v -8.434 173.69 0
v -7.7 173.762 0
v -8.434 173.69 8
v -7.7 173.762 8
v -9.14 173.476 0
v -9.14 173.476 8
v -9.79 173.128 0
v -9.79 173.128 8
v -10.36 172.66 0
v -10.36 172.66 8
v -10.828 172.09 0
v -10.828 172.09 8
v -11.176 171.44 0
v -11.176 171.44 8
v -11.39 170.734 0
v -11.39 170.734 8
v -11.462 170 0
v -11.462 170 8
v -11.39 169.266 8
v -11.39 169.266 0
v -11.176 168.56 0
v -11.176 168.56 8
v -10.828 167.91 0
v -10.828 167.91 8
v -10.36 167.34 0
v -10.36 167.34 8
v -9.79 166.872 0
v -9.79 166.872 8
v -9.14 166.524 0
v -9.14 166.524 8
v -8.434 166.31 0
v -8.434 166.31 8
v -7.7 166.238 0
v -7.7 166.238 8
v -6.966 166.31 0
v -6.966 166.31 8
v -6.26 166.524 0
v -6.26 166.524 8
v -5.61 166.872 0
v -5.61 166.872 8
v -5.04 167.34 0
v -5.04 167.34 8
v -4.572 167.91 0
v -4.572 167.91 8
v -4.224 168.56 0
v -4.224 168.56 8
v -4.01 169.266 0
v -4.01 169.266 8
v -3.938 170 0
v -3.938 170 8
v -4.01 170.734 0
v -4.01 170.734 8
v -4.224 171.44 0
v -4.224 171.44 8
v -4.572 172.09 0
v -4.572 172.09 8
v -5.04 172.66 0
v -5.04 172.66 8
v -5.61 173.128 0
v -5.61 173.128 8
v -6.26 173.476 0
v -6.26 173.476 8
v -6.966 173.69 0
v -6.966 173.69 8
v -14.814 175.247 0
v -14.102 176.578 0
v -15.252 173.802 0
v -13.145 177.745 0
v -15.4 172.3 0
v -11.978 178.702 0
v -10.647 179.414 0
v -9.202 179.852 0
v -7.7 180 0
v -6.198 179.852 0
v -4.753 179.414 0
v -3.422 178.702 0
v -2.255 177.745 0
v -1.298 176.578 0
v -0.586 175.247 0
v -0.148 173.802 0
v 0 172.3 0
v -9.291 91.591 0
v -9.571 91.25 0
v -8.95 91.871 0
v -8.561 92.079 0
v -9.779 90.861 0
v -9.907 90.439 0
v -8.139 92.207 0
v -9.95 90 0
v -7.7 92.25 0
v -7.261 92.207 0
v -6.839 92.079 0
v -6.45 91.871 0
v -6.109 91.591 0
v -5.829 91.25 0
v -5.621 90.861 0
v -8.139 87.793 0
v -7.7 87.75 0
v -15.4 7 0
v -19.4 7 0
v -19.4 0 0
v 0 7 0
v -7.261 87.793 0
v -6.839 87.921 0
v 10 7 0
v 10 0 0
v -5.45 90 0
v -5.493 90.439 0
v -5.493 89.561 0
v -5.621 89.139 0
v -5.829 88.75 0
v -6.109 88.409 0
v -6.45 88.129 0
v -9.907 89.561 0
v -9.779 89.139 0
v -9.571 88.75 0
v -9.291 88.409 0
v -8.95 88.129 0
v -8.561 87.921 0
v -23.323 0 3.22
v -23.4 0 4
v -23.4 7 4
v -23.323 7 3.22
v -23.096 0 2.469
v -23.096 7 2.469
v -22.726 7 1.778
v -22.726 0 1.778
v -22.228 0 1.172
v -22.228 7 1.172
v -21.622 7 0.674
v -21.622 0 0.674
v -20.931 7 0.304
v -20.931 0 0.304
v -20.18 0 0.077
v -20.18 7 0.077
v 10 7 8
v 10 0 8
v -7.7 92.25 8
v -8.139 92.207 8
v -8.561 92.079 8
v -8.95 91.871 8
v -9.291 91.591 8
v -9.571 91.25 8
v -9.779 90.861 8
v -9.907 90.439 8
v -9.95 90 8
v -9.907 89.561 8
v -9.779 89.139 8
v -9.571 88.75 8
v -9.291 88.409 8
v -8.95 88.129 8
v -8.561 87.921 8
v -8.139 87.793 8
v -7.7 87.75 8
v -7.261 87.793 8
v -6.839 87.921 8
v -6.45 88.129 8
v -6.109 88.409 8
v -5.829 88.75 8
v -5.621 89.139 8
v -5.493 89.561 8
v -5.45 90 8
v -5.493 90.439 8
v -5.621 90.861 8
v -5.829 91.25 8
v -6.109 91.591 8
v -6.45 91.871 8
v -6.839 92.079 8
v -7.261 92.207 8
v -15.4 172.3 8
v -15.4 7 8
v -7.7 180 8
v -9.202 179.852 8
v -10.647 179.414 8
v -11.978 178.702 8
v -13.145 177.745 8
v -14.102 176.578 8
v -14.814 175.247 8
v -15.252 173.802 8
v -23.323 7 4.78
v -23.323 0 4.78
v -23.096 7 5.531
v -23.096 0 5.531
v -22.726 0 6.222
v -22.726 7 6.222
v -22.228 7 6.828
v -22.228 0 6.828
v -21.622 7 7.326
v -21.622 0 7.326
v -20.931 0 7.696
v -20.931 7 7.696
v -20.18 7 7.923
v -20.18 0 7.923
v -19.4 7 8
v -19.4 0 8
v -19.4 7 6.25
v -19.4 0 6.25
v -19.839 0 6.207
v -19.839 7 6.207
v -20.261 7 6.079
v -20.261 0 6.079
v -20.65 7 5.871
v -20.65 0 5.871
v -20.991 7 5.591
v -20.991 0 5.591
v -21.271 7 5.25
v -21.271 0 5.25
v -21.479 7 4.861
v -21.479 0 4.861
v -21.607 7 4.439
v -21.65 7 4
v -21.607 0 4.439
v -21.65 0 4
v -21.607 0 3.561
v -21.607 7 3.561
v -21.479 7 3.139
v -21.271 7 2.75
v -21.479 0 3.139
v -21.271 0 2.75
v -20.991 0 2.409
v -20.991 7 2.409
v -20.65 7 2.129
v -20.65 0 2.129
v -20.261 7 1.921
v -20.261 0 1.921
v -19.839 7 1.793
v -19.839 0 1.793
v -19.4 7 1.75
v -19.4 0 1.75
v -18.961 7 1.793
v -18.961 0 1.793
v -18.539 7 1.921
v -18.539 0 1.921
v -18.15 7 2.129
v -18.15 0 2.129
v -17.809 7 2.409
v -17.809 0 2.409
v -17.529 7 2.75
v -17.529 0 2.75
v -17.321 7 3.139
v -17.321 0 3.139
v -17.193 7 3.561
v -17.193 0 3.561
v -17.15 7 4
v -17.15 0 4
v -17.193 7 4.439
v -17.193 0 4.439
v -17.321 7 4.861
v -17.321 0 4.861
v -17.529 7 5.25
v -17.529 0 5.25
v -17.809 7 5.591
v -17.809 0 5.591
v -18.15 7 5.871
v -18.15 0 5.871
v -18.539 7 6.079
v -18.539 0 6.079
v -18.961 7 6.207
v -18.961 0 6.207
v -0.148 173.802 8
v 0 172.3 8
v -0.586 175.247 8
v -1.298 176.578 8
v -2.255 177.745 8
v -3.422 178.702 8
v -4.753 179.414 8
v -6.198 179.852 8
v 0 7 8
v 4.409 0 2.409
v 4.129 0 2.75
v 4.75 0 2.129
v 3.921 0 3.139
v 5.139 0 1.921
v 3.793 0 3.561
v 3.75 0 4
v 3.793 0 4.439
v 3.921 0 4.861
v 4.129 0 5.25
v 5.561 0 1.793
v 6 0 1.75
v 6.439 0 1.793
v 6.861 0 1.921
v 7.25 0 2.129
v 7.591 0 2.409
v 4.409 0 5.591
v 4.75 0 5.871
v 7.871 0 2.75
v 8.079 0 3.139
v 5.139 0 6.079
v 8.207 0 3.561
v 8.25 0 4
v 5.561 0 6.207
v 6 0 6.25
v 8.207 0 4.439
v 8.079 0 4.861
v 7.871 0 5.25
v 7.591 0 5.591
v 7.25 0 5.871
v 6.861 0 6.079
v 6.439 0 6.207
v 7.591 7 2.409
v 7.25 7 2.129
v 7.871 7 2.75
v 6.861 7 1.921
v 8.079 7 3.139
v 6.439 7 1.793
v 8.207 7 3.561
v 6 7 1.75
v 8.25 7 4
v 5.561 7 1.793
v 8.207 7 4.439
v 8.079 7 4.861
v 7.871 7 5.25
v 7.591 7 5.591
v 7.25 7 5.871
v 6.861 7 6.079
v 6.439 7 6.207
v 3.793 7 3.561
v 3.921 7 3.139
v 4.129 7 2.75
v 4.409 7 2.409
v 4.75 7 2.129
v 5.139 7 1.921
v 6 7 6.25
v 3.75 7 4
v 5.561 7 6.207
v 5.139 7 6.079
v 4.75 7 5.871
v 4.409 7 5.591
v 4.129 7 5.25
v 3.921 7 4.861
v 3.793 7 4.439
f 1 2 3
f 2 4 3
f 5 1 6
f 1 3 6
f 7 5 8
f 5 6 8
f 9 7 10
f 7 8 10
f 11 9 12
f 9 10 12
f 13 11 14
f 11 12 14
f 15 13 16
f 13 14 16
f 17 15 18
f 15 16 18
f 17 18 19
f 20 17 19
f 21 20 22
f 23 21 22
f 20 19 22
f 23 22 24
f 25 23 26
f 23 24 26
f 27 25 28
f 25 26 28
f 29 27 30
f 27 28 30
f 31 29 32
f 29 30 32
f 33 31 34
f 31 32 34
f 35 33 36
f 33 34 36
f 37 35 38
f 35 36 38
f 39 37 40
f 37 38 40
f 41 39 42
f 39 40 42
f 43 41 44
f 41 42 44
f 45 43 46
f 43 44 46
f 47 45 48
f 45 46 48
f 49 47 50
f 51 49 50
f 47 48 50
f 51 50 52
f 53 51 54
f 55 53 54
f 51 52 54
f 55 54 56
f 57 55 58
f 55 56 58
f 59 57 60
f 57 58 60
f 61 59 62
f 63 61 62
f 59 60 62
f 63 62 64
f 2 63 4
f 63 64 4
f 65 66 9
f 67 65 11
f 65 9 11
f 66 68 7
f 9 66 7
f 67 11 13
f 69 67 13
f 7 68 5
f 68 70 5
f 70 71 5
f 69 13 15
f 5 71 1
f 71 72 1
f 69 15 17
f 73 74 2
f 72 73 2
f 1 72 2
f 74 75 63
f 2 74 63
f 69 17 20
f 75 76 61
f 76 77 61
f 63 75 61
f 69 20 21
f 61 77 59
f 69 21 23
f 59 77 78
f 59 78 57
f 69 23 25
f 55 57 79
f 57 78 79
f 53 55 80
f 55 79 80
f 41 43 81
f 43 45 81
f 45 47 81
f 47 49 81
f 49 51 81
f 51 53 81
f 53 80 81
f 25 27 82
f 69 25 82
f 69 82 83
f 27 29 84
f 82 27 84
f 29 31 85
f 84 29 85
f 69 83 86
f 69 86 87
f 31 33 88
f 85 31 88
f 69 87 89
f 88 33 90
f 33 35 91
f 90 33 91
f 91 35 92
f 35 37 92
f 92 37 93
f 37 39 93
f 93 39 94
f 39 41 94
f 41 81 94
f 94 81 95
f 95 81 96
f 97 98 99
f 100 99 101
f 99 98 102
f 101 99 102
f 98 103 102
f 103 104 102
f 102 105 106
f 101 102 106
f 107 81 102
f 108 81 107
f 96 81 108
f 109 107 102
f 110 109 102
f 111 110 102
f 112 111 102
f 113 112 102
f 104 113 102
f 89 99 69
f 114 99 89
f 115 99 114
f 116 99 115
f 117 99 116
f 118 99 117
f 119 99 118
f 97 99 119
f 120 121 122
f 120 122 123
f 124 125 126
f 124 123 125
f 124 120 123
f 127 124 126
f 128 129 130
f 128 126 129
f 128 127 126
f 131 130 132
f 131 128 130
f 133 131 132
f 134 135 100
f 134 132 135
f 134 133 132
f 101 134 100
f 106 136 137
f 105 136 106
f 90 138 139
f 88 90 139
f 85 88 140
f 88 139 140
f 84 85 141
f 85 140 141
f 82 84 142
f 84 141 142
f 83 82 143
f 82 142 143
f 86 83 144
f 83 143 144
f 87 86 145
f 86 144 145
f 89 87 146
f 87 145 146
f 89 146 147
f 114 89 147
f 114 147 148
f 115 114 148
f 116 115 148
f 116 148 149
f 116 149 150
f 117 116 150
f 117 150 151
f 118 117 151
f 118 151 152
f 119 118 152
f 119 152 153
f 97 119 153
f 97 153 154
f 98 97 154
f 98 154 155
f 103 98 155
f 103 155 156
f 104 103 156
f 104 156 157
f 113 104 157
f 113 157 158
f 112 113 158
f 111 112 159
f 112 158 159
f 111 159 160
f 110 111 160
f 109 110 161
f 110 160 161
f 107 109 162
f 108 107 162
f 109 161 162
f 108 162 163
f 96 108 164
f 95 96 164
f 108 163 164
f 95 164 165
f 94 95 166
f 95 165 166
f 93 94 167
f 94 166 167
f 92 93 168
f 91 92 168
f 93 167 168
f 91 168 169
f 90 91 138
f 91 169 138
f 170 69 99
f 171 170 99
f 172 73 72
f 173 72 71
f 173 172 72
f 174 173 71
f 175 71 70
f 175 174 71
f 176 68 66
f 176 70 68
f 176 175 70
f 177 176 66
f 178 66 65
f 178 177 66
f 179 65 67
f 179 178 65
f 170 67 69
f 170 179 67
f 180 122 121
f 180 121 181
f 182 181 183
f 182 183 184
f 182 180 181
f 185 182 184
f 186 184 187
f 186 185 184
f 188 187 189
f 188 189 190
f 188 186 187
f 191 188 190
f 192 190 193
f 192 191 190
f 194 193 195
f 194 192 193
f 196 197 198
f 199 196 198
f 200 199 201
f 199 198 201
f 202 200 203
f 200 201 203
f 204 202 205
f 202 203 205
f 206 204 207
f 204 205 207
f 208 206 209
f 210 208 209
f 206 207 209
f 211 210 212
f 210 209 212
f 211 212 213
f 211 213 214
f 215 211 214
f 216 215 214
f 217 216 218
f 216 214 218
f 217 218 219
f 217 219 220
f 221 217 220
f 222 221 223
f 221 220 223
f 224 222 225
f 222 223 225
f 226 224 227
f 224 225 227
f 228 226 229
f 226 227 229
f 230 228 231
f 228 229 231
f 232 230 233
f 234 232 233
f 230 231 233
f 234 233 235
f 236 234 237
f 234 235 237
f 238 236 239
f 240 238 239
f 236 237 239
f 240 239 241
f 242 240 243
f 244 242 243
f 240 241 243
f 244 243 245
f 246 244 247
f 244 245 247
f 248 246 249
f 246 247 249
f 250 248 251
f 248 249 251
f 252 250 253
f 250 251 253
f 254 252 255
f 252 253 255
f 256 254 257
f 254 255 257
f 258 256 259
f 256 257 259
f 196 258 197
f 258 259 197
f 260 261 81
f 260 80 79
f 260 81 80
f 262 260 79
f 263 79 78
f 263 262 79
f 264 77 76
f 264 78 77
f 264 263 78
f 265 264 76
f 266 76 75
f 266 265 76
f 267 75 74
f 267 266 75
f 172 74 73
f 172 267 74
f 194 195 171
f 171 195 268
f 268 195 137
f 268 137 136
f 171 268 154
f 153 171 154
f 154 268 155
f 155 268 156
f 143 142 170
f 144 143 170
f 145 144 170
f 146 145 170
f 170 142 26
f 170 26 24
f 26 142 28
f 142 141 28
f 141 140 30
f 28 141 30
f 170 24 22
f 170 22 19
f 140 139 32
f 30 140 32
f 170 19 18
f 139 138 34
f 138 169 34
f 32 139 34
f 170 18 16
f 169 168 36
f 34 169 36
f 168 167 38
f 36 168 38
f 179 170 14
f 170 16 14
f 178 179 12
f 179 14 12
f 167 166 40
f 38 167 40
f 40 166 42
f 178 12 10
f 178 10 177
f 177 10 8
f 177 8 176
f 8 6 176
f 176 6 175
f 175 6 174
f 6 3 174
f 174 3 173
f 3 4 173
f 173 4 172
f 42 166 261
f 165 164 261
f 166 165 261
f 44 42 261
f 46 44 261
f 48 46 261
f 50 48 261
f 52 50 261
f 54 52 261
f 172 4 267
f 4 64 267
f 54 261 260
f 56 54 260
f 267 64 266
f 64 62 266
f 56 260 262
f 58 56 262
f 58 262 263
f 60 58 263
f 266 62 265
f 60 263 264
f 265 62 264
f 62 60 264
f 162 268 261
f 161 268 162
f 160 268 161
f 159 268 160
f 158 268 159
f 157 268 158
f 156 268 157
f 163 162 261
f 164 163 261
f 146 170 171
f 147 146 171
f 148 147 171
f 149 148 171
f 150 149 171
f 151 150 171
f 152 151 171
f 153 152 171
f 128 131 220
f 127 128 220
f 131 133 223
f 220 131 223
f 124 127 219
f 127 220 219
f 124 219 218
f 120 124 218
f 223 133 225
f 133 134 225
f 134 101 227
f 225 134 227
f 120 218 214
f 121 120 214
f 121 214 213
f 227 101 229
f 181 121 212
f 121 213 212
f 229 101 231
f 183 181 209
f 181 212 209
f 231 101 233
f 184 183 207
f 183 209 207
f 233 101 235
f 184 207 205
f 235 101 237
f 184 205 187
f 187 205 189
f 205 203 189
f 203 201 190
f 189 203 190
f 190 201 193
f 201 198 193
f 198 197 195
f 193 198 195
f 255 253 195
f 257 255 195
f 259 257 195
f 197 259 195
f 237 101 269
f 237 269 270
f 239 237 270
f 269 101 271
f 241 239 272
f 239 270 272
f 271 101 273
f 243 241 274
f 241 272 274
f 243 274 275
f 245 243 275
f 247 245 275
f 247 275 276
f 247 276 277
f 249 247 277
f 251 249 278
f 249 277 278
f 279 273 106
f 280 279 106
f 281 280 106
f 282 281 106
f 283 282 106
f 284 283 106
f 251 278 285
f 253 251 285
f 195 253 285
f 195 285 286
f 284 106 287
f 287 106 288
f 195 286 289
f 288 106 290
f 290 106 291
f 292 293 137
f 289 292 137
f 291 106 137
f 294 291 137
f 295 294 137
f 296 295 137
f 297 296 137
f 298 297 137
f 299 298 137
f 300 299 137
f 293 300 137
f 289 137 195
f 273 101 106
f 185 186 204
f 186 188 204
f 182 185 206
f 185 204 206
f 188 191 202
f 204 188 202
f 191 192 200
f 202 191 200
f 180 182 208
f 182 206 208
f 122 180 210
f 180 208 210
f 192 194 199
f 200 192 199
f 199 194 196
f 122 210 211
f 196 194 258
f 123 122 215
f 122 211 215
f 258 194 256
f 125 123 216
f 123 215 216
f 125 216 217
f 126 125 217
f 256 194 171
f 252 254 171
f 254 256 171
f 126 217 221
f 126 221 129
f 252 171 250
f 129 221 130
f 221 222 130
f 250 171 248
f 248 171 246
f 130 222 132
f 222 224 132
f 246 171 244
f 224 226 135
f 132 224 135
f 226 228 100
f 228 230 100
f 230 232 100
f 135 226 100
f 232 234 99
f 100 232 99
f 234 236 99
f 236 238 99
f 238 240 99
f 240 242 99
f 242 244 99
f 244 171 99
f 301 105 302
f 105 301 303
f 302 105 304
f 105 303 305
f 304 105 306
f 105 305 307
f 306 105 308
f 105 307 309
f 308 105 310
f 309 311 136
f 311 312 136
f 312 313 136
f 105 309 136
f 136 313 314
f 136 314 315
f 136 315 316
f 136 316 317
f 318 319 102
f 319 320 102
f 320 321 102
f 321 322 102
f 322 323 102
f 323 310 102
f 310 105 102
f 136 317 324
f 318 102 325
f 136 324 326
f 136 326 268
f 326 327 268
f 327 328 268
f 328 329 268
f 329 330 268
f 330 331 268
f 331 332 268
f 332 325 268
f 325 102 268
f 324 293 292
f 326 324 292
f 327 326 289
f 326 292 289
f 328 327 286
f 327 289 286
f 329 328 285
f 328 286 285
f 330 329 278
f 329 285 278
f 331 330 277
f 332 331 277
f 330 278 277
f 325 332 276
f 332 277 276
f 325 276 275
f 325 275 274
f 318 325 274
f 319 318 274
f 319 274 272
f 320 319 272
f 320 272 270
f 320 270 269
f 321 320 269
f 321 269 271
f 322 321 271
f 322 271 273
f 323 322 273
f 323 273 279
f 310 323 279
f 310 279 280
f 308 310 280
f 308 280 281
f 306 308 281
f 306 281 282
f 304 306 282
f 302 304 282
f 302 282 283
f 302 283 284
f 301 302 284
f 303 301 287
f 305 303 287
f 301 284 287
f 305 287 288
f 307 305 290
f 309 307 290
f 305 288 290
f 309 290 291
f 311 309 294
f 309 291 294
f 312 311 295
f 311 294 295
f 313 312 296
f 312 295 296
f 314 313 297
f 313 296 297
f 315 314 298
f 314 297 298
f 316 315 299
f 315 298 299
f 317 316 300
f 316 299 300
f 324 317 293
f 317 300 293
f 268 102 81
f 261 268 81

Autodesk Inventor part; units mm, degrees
ref_plane "YZ Plane" through (0, 0, 0) normal (1, 0, 0) x (0, 1, 0)
ref_plane "XZ Plane" through (0, 0, 0) normal (0, 1, 0) x (-1, 0, 0)
ref_plane "XY Plane" through (0, 0, 0) normal (0, 0, 1) x (1, 0, 0)
sketch "Sketch1" plane through (0, 0, 0) normal (0, 0, 1) x (1, 0, 0)
  line L0 (-15.4, 0) -> (0, 0)
  line L1 (0, 0) -> (0, 180)
  line L2 (0, 180) -> (-15.4, 180)
  line L3 (-15.4, 180) -> (-15.4, 0)
  point P0 (0, 0)
  point P1 (-7.7, 170)
  dimension "d0" = 15.4
  dimension "d1" = 180
  dimension "d2" = 0
  dimension "d3" = 0
  dimension "d4" = 7.7
  dimension "d5" = 170
extrude "Extrusion1" add sketch "Sketch1" along normal blind 8
hole "Hole1" at (-7.7, 170, 0) direction (0, 0, 1) diameter 7.525 end through all
sketch "Sketch2" plane through (0, 0, 0) normal (1, 0, 0) x (0, 0, -1)
  point P0 (0, 0)
sketch "Sketch5" plane through (0, 0, 0) normal (0, 0, -1) x (-1, 0, 0)
  line L0 (15.4, 180) -> (15.4, 0) projected
  line L1 (15.4, 0) -> (0, 0) projected
  point P0 (7.7, 90)
  dimension "d27" = 7.7
  dimension "d28" = 90
full round fillet "Full Round Fillet1" first side at (0, 60, 2.6667) centre faces at (-5.1333, 180, 2.6667) second side at (-15.4, 120, 2.6667)
hole "Hole3" at (-7.7, 90, 0) direction (0, 0, 1) diameter 4.5 end through all clearance for "Flat Head Machine Screw" size "M4" standard "Ansi Metric M Profile"
sketch "Sketch6" plane through (0, 0, 8) normal (1, 0, 0) x (0, 0, -1)
  line L0 (0, 172.3) -> (0, 0) projected
  line L1 (8, 172.3) -> (8, 0) projected
  line L2 (0, 0) -> (8, 0)
  line L3 (8, 0) -> (8, 7)
  line L4 (8, 7) -> (0, 7)
  line L5 (0, 7) -> (0, 0)
  point P0 (8, 0)
  point P1 (0, 7)
  dimension "d36" = 7
extrude "Extrusion3" add sketch "Sketch6" along normal blind 10
sketch "Sketch7" plane through (0, 7, 8) normal (0, 1, 0) x (1, 0, 0)
  line L0 (0, 8) -> (10, 8) projected
  line L1 (10, 8) -> (10, 0) projected
  point P0 (6, 4)
  dimension "d39" = 4
  dimension "d40" = 4
hole "Hole4" at (6, 7, 4) direction (0, -1, 0) diameter 4.5 end through all clearance for "Flat Head Machine Screw" size "M4" standard "Ansi Metric M Profile"
sketch "Sketch8" plane through (-15.4, 0, 0) normal (-1, 0, 0) x (0, 0, 1)
  point P0 (0, 0)
sketch "Sketch9" plane through (-15.4, 0, 0) normal (-1, 0, 0) x (0, 0, 1)
  line L0 (0, 0) -> (8, 0) projected
  line L1 (8, 7) -> (8, 172.3) projected
  line L2 (0, 0) -> (8, 0)
  line L3 (8, 0) -> (8, 7)
  line L4 (8, 7) -> (0, 7)
  line L5 (0, 7) -> (0, 0)
extrude "Extrusion4" add sketch "Sketch9" along normal blind 8
sketch "Sketch10" plane through (-15.4, 7, 8) normal (0, 1, 0) x (1, 0, 0)
  line L0 (-8, 0) -> (-8, 8) projected
  line L1 (0, 8) -> (-8, 8) projected
  line L2 (0, 8) -> (0, 0) projected
  point P0 (15.4, 8)
  point P1 (-4, 4)
  dimension "d51" = 4
  dimension "d59" = 4
hole "Hole5" at (-19.4, 7, 4) direction (0, -1, 0) diameter 4.5 end through all clearance for "Flat Head Machine Screw" size "M4" standard "Ansi Metric M Profile"
full round fillet "Full Round Fillet2" first side at (-7.7, 33.9167, 8) centre faces at (-23.4, 2.3333, 2.6667) second side at (-7.7, 33.9167, 0)
properties part number "Slide Strut"
